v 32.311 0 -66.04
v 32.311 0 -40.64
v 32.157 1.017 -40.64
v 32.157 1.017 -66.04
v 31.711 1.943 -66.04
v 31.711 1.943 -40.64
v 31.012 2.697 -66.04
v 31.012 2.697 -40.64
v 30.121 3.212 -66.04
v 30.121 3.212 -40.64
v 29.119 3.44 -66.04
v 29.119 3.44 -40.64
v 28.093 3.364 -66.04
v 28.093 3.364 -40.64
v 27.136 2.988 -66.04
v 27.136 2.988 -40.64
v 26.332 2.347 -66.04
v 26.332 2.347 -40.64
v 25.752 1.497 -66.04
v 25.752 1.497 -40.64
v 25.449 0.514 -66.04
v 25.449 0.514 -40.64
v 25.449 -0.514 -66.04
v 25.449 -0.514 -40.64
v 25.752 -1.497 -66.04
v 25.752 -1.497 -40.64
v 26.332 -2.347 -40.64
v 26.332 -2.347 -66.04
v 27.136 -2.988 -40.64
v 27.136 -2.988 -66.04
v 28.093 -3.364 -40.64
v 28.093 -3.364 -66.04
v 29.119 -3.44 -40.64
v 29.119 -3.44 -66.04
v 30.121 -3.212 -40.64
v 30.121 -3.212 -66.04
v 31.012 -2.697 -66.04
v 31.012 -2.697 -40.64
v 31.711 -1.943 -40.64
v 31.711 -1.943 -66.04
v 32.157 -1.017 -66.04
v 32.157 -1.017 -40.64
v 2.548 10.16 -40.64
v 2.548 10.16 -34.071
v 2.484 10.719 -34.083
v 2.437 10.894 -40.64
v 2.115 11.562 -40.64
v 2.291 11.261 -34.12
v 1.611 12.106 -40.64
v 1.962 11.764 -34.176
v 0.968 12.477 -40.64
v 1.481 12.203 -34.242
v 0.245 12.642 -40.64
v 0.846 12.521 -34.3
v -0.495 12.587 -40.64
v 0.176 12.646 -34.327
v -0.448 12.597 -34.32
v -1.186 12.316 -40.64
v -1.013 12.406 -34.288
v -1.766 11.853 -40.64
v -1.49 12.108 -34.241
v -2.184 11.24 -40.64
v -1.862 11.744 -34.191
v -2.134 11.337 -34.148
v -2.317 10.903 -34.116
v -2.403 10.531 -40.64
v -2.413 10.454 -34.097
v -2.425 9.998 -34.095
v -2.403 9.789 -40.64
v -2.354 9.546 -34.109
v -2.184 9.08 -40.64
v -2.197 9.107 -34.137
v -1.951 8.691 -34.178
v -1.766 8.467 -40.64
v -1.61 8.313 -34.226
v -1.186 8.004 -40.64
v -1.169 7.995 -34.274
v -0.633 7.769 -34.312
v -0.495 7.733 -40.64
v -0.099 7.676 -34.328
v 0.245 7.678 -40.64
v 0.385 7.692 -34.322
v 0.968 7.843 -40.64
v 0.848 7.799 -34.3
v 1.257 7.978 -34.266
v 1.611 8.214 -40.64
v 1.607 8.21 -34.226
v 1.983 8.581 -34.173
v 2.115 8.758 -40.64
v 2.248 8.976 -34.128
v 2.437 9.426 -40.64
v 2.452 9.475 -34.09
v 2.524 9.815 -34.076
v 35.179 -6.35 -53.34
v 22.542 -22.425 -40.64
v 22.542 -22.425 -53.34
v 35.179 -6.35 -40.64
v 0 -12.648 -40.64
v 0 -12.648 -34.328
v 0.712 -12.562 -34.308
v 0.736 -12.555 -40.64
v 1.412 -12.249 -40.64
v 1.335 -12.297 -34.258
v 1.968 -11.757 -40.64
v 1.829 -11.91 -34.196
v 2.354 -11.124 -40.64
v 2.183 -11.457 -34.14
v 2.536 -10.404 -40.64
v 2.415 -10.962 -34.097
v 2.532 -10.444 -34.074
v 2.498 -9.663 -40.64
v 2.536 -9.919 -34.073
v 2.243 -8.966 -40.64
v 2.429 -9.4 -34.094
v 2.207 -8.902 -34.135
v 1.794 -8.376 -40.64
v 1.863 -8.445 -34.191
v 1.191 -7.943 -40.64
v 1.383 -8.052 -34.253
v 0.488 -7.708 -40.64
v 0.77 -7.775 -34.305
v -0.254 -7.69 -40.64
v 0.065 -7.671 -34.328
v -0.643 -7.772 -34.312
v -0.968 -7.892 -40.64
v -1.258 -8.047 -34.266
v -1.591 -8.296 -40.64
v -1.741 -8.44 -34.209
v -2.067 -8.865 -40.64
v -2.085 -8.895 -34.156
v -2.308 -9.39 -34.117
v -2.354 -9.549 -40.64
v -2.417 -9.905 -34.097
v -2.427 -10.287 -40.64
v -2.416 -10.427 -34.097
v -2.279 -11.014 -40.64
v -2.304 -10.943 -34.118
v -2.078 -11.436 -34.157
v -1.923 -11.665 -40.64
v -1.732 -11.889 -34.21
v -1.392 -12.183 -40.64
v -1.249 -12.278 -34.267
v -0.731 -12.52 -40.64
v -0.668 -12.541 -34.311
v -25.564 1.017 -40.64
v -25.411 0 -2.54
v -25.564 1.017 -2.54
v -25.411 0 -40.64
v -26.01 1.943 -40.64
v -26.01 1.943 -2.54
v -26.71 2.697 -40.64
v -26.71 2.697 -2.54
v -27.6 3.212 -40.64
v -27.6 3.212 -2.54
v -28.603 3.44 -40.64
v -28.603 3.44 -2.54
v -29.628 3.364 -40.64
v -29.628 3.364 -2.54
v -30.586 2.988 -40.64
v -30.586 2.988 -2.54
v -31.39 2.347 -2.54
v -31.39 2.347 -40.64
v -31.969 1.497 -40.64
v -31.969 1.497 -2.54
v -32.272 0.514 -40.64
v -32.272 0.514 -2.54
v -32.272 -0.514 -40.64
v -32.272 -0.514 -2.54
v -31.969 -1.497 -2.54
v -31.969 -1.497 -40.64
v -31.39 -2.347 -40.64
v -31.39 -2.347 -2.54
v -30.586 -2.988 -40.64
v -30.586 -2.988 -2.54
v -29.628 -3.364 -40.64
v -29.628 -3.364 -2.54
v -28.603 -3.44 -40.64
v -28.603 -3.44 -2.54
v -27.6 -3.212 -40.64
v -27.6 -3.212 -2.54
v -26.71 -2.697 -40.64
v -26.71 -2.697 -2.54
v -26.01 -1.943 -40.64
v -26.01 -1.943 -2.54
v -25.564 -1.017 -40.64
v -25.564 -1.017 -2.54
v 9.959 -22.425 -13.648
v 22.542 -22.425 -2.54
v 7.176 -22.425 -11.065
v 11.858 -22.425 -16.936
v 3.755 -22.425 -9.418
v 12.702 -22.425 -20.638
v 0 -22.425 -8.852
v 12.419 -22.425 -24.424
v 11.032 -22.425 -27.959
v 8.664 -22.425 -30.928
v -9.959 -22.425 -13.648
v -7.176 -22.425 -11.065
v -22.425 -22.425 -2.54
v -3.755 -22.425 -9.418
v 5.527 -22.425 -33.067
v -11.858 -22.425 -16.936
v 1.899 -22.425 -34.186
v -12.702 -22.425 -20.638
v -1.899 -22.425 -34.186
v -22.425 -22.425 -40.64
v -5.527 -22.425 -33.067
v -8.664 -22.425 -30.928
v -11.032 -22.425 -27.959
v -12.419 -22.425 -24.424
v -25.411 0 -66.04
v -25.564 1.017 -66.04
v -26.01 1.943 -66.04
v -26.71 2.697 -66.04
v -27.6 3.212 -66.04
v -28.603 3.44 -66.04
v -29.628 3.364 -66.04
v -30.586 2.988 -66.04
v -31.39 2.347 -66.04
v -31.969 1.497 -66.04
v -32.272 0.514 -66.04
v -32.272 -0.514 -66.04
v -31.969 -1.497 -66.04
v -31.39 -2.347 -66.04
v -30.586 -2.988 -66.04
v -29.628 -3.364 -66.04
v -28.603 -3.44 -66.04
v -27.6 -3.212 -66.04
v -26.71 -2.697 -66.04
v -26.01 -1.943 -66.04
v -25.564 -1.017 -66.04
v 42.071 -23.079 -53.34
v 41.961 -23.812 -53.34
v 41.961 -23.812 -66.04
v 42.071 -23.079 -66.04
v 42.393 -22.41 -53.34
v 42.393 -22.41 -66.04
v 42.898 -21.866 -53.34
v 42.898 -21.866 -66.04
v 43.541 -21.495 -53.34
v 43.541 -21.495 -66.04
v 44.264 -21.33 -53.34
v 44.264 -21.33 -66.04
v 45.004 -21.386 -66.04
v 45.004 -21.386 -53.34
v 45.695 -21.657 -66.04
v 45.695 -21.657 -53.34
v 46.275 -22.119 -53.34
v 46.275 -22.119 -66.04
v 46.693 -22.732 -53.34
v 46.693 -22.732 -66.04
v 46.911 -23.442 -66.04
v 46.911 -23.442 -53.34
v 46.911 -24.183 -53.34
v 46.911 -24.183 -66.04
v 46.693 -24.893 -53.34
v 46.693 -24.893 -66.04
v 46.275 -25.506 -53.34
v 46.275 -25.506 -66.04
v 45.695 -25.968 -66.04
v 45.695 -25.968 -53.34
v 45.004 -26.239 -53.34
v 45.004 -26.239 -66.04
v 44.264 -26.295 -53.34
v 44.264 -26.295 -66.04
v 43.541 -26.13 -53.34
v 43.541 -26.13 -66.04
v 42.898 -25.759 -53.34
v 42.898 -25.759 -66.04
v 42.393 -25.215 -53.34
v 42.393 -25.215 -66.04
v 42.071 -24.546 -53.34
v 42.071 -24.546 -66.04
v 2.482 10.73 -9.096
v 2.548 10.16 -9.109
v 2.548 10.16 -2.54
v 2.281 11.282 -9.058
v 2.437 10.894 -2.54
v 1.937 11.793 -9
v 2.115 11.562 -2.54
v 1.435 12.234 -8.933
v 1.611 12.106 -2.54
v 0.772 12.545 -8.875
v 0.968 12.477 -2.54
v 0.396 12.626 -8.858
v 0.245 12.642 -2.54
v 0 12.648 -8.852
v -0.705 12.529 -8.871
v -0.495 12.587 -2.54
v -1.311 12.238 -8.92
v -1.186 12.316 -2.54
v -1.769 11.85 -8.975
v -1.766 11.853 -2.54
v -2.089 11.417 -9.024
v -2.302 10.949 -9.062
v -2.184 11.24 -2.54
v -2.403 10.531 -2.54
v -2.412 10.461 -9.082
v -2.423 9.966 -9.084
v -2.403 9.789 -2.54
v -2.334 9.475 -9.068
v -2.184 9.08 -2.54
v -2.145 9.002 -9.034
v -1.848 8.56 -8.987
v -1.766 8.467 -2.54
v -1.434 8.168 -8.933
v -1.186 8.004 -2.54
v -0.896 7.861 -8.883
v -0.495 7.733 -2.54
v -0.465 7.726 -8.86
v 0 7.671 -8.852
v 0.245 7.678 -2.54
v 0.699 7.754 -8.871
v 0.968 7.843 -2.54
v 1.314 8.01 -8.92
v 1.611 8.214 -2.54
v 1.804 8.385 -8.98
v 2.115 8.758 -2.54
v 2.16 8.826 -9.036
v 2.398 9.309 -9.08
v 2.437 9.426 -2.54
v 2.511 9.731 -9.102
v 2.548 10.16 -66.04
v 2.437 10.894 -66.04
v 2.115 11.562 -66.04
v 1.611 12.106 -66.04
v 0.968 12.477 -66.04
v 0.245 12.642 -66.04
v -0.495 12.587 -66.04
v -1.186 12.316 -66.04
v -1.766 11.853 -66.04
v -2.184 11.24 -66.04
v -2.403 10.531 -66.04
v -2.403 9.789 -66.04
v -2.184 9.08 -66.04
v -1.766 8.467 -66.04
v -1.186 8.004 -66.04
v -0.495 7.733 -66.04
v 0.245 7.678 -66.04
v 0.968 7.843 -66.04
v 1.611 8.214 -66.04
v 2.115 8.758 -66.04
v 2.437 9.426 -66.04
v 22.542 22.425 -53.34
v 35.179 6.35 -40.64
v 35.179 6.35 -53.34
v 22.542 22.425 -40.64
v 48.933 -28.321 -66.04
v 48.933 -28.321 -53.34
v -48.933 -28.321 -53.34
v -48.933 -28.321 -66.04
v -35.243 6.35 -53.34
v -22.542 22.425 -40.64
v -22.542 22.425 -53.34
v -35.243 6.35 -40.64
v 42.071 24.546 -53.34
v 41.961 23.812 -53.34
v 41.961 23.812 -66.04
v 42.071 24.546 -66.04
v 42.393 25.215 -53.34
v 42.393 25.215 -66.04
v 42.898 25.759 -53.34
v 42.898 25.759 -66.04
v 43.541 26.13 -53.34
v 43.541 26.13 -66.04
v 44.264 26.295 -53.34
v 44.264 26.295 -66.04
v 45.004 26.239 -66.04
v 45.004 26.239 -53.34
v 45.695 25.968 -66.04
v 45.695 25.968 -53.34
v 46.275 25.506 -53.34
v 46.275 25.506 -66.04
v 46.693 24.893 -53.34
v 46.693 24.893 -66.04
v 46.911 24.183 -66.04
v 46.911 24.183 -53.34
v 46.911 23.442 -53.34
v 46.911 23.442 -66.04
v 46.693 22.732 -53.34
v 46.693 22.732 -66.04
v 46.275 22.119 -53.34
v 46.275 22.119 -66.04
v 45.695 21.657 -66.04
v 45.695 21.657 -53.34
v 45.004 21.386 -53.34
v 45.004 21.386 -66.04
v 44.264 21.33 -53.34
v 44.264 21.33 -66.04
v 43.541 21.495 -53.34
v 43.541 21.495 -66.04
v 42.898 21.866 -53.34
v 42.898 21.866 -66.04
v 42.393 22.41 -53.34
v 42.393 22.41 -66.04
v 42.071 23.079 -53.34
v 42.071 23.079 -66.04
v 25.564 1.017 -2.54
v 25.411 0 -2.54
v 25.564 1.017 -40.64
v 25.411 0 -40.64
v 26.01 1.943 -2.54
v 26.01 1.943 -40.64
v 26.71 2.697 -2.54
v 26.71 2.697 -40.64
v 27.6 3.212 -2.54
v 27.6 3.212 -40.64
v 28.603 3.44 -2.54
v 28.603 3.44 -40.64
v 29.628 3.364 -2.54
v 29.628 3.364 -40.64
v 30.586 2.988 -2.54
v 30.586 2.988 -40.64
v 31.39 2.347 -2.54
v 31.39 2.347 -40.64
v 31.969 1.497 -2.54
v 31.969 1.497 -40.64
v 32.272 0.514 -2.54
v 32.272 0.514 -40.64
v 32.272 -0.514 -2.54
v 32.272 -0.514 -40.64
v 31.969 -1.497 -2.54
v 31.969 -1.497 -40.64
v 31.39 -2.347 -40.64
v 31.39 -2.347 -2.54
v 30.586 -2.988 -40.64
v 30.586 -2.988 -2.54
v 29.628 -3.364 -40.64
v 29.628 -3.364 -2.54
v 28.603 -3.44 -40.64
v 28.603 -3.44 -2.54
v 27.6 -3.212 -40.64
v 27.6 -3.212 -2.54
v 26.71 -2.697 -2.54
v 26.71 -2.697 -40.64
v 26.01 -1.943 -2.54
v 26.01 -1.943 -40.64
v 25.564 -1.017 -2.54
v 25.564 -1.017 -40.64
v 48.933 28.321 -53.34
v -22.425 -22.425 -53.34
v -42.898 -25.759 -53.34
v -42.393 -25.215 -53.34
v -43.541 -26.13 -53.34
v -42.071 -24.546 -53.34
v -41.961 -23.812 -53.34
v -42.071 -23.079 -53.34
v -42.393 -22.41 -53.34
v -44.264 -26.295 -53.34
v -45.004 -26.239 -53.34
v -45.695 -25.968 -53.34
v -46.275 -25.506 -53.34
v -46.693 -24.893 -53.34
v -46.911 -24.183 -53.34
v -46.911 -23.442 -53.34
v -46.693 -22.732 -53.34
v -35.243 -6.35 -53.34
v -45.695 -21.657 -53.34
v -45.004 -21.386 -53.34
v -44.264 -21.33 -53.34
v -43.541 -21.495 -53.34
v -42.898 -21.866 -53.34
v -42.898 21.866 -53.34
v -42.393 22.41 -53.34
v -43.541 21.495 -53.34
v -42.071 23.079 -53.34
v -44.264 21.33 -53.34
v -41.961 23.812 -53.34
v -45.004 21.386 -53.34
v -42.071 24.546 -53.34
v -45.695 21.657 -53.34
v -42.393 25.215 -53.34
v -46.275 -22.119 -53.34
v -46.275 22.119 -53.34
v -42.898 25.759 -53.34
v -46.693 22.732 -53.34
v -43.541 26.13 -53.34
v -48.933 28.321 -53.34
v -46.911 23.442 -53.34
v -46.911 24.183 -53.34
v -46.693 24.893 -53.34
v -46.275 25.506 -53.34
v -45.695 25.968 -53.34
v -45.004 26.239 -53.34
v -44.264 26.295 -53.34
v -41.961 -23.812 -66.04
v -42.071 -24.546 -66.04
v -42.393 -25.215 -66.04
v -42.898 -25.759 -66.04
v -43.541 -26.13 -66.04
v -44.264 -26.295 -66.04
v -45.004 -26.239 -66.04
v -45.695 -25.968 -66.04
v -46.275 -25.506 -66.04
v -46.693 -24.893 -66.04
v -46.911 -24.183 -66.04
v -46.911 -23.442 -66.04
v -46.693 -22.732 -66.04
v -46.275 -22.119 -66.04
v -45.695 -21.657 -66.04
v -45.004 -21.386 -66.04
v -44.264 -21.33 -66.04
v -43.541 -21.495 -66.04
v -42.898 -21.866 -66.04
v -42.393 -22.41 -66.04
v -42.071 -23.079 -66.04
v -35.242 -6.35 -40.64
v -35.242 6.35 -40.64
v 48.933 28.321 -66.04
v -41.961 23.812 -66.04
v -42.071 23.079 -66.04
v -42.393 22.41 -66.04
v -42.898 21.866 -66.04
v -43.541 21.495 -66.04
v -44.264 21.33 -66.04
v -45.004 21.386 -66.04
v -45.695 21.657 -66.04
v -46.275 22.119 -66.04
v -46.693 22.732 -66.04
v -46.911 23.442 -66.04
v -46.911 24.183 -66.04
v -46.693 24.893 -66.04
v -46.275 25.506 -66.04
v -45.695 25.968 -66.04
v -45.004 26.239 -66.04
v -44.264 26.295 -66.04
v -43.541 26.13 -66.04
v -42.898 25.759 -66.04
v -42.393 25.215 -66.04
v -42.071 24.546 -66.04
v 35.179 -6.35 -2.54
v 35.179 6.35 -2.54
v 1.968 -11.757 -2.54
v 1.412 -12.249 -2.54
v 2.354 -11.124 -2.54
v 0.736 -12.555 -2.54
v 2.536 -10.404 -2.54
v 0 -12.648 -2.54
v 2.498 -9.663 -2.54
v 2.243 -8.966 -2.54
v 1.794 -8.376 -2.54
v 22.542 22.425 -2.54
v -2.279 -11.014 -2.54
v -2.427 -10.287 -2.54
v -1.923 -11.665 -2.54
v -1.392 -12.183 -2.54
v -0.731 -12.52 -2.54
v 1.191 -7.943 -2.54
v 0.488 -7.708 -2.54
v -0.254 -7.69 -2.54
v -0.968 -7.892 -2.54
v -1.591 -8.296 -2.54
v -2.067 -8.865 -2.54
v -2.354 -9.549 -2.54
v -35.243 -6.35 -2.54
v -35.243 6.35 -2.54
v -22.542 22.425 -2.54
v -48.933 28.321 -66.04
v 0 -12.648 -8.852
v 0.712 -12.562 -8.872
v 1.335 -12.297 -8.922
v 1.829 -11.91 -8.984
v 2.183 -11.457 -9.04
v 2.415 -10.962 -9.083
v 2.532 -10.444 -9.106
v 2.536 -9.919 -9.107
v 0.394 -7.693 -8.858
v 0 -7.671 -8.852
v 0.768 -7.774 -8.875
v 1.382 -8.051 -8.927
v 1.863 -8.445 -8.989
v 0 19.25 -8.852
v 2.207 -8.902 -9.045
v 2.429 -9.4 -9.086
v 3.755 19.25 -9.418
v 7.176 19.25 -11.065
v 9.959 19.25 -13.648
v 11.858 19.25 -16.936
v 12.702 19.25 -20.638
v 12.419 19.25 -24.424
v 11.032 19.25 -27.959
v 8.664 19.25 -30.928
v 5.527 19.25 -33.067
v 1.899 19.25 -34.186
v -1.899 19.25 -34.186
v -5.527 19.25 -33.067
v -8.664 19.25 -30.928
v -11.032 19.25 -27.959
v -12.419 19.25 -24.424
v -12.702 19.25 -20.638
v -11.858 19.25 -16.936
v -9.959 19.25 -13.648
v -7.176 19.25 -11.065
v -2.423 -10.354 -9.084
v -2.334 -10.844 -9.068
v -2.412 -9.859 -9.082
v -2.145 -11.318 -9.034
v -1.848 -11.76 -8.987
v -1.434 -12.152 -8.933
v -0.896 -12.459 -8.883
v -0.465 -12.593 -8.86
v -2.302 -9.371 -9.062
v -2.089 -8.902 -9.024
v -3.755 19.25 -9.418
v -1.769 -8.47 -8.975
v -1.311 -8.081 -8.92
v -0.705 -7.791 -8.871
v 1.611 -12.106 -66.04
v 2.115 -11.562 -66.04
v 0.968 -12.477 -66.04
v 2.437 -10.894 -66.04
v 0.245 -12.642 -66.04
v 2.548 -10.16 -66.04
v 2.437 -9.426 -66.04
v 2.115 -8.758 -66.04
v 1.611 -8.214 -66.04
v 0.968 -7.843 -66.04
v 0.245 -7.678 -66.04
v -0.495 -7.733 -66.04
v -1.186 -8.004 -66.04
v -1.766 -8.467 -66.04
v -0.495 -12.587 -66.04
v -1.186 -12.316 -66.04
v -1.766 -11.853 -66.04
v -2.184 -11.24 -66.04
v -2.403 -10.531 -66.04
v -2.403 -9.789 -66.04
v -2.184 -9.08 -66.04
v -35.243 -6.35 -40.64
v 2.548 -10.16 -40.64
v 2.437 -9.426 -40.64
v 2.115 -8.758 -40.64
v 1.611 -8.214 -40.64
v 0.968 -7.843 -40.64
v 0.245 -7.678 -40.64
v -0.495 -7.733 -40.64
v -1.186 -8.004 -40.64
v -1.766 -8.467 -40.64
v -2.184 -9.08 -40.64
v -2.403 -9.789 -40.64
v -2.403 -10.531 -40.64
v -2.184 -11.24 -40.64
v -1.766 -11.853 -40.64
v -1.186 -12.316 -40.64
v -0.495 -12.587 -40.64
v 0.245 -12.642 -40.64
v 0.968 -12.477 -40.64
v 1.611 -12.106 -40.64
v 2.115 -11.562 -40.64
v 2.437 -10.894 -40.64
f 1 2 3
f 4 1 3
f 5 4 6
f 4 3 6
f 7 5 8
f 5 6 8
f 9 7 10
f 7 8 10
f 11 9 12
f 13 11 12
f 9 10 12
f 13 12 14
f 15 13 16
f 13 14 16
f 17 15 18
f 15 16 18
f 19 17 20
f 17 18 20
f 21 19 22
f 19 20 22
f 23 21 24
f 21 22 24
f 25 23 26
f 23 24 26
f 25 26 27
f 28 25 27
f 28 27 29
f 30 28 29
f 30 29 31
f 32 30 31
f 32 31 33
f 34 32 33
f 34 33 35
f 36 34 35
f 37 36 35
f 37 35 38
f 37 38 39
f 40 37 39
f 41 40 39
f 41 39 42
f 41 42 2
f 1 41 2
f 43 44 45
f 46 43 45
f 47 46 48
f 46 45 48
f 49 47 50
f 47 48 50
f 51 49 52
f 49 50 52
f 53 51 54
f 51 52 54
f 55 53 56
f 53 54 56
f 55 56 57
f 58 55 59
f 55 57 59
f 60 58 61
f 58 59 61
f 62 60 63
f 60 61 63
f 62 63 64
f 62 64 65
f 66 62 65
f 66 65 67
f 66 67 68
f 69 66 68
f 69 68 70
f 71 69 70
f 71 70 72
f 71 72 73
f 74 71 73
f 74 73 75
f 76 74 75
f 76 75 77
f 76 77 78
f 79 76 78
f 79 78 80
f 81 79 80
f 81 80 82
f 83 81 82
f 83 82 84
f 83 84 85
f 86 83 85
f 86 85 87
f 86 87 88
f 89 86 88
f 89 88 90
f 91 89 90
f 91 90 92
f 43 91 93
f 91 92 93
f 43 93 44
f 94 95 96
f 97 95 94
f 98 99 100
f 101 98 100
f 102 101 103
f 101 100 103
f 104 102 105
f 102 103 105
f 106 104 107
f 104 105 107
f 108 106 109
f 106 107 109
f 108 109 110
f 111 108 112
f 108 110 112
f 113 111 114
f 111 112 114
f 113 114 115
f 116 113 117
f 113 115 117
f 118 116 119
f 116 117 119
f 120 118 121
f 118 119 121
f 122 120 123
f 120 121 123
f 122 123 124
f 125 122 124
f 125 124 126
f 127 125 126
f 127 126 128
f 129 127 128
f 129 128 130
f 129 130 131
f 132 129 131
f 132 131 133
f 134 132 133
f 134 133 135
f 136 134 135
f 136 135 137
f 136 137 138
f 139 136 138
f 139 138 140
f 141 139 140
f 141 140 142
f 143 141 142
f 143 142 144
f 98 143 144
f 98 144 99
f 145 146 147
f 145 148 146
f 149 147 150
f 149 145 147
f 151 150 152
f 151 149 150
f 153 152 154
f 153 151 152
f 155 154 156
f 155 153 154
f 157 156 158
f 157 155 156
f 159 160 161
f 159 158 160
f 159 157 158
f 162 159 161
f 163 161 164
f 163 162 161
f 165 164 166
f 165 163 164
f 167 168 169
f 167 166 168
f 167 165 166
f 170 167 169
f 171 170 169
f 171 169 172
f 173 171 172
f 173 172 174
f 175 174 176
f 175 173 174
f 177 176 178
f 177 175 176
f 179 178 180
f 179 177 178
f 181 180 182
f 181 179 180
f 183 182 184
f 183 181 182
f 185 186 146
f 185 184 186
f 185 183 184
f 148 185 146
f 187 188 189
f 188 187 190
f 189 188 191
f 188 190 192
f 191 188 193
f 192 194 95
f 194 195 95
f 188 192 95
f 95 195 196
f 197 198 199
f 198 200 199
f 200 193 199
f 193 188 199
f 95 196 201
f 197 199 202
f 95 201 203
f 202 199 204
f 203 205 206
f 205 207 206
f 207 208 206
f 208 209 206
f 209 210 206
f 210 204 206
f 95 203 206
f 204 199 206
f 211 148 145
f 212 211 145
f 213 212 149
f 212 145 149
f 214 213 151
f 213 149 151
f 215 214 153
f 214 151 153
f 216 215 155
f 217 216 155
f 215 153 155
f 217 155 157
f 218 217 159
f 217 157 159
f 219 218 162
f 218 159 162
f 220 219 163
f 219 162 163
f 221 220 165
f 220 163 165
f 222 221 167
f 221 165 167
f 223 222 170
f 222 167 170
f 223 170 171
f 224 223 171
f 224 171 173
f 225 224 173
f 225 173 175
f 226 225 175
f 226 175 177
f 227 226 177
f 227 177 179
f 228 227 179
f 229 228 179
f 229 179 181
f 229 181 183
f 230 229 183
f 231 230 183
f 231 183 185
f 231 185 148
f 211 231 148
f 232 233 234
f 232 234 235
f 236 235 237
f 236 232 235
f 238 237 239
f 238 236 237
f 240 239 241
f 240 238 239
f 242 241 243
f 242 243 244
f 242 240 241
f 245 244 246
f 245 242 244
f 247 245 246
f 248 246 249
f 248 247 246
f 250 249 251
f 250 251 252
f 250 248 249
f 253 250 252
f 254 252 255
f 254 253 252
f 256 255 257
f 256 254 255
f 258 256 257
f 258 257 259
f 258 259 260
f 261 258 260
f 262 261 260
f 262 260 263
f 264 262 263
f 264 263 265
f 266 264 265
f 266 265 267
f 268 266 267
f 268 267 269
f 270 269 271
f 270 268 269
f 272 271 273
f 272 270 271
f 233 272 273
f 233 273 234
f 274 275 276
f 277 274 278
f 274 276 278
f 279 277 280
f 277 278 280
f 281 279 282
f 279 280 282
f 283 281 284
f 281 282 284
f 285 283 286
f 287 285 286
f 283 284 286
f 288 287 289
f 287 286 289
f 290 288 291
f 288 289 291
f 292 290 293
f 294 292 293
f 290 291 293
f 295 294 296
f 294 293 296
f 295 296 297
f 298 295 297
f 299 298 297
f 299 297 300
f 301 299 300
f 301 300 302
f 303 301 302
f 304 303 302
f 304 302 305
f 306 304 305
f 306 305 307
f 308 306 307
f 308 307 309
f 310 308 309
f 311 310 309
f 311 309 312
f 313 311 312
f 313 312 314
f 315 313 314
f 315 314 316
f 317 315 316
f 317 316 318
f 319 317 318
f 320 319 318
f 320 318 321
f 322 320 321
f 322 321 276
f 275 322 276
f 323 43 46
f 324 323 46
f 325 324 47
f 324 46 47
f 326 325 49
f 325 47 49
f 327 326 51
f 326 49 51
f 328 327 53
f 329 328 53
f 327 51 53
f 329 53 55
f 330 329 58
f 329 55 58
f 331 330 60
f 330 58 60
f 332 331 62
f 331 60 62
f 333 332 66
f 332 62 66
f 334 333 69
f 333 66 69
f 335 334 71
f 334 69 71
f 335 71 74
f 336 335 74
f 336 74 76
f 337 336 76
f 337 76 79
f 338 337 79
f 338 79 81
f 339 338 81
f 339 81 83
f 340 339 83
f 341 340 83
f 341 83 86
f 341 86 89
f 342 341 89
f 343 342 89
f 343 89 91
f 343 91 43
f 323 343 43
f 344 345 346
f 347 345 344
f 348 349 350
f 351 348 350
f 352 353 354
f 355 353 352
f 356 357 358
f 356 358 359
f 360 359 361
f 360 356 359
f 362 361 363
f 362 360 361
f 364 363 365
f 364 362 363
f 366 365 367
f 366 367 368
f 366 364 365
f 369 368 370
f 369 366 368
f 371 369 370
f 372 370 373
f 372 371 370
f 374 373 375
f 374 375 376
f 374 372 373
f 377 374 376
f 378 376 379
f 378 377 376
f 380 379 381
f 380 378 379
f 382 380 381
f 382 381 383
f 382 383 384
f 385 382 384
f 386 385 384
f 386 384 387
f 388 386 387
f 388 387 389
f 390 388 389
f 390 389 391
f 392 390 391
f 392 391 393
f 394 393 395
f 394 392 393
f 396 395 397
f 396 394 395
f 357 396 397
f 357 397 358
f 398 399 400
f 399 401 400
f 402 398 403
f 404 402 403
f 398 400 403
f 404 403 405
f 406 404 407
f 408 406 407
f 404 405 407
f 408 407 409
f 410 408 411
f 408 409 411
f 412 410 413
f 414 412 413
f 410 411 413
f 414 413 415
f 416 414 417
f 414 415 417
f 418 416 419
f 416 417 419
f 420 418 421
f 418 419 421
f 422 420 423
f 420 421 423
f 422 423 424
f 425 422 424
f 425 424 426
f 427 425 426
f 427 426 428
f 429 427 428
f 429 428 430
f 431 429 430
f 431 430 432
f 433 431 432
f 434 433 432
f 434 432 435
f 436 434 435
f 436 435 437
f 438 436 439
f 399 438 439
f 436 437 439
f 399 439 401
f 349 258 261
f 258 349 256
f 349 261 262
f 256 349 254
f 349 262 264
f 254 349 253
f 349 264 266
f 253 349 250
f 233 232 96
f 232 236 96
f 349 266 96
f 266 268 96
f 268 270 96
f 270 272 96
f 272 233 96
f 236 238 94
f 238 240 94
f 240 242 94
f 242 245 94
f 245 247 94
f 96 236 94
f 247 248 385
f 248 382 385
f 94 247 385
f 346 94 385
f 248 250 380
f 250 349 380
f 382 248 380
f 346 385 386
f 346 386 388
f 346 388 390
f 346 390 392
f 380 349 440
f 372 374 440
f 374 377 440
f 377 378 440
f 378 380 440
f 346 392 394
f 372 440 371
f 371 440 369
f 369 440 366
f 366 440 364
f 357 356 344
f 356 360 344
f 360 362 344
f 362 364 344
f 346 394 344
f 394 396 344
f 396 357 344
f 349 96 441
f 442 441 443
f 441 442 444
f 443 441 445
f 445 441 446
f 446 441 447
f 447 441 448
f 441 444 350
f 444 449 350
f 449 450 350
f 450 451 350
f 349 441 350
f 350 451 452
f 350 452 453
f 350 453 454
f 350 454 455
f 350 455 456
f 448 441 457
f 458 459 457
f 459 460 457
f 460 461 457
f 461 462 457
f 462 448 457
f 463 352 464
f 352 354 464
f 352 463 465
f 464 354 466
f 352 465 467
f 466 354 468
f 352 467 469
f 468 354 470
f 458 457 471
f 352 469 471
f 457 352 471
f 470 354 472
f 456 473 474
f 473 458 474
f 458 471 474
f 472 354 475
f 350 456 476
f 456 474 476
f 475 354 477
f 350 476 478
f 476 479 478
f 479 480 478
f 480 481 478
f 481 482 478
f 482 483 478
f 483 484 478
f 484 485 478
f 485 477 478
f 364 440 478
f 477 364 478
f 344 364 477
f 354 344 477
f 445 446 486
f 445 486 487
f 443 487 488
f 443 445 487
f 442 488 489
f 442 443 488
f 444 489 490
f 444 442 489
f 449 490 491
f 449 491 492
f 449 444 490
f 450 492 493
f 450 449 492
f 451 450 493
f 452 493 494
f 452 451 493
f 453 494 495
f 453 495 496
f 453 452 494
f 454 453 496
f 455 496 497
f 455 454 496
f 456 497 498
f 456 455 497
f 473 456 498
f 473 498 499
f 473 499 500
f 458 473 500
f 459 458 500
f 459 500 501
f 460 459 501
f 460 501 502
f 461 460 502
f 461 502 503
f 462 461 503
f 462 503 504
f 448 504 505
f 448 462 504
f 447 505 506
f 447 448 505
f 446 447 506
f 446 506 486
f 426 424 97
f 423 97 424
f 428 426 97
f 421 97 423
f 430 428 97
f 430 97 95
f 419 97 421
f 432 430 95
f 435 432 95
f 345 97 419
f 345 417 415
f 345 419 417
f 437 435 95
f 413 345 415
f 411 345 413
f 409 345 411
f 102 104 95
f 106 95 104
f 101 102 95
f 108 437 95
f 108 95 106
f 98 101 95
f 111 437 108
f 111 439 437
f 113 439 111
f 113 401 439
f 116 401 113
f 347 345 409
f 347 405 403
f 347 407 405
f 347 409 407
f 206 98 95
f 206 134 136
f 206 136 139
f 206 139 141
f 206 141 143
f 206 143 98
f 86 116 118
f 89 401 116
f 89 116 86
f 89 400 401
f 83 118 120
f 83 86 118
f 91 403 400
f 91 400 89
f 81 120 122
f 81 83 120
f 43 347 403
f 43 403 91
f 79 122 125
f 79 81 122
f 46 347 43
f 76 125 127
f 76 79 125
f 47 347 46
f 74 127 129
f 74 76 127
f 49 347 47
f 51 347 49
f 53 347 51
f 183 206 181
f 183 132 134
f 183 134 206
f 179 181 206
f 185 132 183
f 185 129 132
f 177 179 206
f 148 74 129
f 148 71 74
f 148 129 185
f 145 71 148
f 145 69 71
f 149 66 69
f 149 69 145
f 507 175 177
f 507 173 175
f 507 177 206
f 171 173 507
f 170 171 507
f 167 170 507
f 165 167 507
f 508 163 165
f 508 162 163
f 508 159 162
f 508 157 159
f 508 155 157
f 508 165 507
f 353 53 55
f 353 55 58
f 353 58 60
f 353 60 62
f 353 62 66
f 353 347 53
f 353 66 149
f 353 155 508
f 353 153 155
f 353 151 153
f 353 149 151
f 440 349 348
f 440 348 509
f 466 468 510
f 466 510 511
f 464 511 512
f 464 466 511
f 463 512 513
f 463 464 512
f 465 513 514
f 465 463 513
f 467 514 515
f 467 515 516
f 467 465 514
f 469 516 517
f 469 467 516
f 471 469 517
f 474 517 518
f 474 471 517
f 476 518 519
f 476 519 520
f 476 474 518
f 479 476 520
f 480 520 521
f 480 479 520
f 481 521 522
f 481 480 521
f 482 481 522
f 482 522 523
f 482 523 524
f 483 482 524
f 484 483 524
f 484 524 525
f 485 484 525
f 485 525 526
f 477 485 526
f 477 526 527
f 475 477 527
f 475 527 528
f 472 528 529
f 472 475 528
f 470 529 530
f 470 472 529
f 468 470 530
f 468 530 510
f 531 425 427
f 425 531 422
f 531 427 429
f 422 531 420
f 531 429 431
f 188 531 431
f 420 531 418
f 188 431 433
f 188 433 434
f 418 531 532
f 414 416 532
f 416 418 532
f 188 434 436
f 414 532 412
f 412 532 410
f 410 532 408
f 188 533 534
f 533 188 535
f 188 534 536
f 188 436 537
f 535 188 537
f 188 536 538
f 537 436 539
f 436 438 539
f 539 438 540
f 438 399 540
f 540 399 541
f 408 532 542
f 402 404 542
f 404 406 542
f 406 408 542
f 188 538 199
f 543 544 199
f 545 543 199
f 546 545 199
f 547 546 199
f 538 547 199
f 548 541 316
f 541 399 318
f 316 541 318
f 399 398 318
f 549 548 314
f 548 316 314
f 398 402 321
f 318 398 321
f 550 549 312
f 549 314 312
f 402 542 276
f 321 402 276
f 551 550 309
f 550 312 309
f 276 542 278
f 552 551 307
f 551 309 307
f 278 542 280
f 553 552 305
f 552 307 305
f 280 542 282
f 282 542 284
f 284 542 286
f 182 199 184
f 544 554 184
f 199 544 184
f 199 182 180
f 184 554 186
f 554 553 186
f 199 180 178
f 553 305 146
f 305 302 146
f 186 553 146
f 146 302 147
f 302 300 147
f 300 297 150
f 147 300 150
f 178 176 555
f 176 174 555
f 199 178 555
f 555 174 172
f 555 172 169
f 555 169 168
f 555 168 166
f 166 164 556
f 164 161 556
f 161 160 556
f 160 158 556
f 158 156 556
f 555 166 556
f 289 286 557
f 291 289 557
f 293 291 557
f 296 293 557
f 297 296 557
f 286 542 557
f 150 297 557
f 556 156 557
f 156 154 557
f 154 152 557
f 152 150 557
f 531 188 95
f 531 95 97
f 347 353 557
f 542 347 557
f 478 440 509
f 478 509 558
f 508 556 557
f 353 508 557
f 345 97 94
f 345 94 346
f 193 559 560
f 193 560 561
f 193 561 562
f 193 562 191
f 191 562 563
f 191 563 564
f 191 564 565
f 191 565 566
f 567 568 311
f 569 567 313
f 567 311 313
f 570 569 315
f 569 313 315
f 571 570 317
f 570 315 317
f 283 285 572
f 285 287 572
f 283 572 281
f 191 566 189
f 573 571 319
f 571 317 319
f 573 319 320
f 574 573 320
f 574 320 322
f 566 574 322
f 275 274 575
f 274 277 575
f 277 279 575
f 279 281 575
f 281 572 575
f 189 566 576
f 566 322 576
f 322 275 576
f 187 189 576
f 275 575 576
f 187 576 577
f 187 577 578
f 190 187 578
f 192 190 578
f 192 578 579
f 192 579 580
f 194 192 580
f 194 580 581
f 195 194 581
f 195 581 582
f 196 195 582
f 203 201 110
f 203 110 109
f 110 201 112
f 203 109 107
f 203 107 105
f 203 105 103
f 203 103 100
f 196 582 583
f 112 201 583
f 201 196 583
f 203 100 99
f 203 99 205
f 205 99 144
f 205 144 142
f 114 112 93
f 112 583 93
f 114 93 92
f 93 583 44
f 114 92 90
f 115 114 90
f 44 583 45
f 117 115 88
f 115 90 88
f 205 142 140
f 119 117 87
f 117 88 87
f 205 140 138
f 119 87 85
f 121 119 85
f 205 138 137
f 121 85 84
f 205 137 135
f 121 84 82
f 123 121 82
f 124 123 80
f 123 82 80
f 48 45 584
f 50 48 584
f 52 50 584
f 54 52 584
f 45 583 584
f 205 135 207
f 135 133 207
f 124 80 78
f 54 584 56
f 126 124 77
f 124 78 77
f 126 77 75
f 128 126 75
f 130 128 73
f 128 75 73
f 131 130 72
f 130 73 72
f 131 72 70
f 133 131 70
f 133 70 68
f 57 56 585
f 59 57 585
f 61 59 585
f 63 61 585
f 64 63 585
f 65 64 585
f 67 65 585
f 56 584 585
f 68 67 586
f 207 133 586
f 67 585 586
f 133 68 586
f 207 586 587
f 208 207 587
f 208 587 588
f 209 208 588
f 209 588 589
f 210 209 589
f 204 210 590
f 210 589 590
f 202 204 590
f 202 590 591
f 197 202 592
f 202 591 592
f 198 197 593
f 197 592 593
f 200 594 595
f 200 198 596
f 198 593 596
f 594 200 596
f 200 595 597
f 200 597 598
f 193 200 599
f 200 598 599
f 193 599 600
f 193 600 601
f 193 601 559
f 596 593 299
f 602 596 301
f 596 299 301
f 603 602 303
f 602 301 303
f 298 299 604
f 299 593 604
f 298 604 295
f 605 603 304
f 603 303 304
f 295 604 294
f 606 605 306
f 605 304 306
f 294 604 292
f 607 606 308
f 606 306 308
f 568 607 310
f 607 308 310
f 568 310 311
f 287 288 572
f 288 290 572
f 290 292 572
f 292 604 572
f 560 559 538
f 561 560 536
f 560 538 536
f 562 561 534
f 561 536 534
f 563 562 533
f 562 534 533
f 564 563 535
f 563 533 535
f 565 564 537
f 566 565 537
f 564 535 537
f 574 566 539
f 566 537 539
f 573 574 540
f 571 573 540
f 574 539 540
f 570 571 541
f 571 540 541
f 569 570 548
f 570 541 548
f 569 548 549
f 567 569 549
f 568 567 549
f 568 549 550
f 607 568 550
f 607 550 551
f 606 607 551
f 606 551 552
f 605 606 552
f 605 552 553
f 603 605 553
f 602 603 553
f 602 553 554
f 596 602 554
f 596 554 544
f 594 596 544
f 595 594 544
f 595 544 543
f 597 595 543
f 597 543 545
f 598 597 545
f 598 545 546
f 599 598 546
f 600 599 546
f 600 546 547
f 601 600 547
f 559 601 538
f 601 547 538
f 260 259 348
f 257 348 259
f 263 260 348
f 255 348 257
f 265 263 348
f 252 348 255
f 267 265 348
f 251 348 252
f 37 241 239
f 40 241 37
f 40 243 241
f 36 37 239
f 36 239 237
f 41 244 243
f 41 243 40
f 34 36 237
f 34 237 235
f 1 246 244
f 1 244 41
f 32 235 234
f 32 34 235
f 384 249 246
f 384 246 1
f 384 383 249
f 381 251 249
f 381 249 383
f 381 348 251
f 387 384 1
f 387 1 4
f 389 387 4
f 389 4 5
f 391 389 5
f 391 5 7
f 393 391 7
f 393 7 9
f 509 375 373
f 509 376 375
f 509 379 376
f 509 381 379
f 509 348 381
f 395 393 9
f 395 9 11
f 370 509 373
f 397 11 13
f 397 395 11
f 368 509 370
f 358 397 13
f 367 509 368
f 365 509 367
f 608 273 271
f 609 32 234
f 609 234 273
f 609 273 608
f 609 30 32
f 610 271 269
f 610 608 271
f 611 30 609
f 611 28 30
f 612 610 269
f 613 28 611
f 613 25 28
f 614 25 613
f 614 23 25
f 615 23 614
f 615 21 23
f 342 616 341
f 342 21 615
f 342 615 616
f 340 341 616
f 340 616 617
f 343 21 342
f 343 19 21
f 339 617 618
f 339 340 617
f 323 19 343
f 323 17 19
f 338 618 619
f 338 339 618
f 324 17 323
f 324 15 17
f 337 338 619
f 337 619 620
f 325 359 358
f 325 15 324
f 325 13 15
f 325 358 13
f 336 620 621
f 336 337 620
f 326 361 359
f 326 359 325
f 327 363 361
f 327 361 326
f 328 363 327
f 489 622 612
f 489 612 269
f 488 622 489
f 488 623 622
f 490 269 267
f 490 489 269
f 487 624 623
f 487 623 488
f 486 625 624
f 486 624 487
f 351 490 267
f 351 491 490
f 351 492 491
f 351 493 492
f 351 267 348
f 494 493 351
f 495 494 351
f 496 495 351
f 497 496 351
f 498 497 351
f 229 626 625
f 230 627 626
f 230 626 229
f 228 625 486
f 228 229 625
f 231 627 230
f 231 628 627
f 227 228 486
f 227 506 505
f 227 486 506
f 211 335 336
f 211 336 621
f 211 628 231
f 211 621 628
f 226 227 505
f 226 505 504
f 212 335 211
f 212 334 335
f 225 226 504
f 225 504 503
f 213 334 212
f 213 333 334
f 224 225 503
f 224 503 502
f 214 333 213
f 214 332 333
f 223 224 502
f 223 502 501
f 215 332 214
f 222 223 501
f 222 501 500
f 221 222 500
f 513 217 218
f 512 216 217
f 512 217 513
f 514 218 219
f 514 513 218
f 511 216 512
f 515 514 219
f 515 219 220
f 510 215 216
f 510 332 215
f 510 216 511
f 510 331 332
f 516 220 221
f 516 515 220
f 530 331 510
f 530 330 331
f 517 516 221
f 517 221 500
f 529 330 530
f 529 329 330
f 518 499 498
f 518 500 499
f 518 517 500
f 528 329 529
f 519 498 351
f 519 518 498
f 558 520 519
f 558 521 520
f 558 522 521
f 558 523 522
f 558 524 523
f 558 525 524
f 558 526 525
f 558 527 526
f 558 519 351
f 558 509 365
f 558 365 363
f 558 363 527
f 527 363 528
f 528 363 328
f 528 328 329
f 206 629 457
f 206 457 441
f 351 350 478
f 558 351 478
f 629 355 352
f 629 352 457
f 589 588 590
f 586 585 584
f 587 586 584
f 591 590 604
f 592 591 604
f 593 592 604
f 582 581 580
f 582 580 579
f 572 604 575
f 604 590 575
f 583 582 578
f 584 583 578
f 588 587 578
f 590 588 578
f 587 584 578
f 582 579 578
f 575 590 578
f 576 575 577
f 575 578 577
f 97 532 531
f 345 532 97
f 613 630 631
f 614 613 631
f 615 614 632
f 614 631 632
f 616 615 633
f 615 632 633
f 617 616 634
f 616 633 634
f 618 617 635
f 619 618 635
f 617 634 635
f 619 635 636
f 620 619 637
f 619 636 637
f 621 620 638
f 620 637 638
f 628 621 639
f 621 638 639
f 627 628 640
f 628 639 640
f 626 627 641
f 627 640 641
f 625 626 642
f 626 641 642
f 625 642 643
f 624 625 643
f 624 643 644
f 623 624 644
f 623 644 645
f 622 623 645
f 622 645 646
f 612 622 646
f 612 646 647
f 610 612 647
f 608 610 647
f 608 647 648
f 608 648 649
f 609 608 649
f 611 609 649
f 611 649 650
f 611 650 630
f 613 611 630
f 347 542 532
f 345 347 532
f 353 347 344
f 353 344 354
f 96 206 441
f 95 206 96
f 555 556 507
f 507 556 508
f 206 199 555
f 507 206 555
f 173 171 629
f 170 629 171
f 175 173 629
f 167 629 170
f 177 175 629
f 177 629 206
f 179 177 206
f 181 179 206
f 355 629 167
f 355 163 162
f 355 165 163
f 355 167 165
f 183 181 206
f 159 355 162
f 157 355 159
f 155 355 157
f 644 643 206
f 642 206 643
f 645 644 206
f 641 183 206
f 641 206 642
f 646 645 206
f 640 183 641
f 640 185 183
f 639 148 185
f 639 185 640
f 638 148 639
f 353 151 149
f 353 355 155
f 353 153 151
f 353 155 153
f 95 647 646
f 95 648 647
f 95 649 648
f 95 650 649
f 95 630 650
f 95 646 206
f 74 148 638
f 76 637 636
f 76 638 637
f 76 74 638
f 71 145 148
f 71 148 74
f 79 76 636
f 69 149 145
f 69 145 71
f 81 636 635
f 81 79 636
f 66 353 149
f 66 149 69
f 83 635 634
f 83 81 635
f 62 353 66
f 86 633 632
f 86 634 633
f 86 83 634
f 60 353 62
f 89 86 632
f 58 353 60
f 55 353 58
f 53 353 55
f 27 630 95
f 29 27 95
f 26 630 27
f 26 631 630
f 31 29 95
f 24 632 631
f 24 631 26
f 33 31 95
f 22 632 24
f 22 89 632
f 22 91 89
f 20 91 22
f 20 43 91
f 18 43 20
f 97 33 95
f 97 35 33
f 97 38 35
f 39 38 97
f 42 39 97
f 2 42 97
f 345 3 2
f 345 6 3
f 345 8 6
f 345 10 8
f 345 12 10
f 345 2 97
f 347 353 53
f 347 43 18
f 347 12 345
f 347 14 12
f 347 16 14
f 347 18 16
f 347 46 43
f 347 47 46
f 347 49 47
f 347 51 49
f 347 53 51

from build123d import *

# Parameters (mm, degrees)
CROQUIS1_W                   = 38.5
CROQUIS1_H                   = 38.5
CROQUIS1_R                   = 1.631954222
SALIENTE_EXTRUIR1_DEPTH      = 3.175
CROQUIS3_W                   = 45.084999084
CROQUIS3_H                   = 18.415000916
SALIENTE_EXTRUIR3_DEPTH      = 3.175
CROQUIS4_W                   = 18.415000916
CROQUIS4_H                   = 38.5
SALIENTE_EXTRUIR4_DEPTH      = 3.175
SALIENTE_EXTRUIR5_DEPTH      = 3.175
CROQUIS6_W                   = 45.084999084
CROQUIS6_H                   = 18.415000916
SALIENTE_EXTRUIR6_DEPTH      = 3.175
CROQUIS7_W                   = 12.817500305
CROQUIS7_H                   = 12.69999981
CROQUIS7_R                   = 2.4892
SALIENTE_EXTRUIR7_DEPTH      = 18.415001
SALIENTE_EXTRUIR8_DEPTH      = 35.179
SALIENTE_EXTRUIR8_DEPTH_BACK = 35.2425
CROQUIS10_W                  = 38.1
CROQUIS10_H                  = 44.85
CORTAR_EXTRUIR1_DEPTH        = 57.537814361
CROQUIS12_R                  = 12.7381
CORTAR_EXTRUIR2_DEPTH        = 71.036889764
CROQUIS13_R                  = 3.45
CORTAR_EXTRUIR3_DEPTH        = 73.335382738
CROQUIS14_R                  = 12.7381
SALIENTE_EXTRUIR9_DEPTH      = 3.175
CROQUIS15_R                  = 2.4892
CORTAR_EXTRUIR4_DEPTH        = 57.537814361
SALIENTE_EXTRUIR10_DEPTH     = 38.1
SALIENTE_EXTRUIR11_DEPTH     = 12.7
CROQUIS19_W                  = 97.8662
CROQUIS19_H                  = 56.642
CROQUIS19_R                  = 2.4892
SALIENTE_EXTRUIR12_DEPTH     = 12.7
CROQUIS20_R                  = 3.45
CROQUIS20_R_2                = 2.4892
CORTAR_EXTRUIR5_DEPTH        = 86.022216606


with BuildPart() as part:
    # Croquis1 → Saliente-Extruir1 (new body)
    with BuildSketch(Plane.XY):
        Rectangle(CROQUIS1_W, CROQUIS1_H)
        with Locations((-14, 14)):
            Circle(CROQUIS1_R, mode=Mode.SUBTRACT)
        with Locations((14, 14)):
            Circle(CROQUIS1_R, mode=Mode.SUBTRACT)
        with Locations(Location((14, -14, 0), (0, 0, 180))):
            Circle(CROQUIS1_R, mode=Mode.SUBTRACT)
        with Locations(Location((-14, -14, 0), (0, 0, 180))):
            Circle(CROQUIS1_R, mode=Mode.SUBTRACT)
        with BuildLine():
            Line((4.778981922, 6.730999947), (11.112500191, 6.730999947))
            Line((11.112500191, 6.730999947), (11.112500191, -6.730999947))
            Line((11.112500191, -6.730999947), (4.778981922, -6.730999947))
            ThreePointArc((4.778981922, -6.730999947), (0, -8.255000211), (-4.778981922, -6.730999947))
            Line((-4.778981922, -6.730999947), (-11.112500191, -6.730999947))
            Line((-11.112500191, -6.730999947), (-11.112500191, 6.730999947))
            Line((-11.112500191, 6.730999947), (-4.778981922, 6.730999947))
            ThreePointArc((-4.778981922, 6.730999947), (0, 8.255000211), (4.778981922, 6.730999947))
        make_face(mode=Mode.SUBTRACT)
    extrude(amount=SALIENTE_EXTRUIR1_DEPTH)

    # Croquis3 → Saliente-Extruir3 (add)
    with BuildSketch(Plane.XZ.offset(19.25)):
        with Locations((0, 9.207500458)):
            Rectangle(CROQUIS3_W, CROQUIS3_H)
    extrude(amount=SALIENTE_EXTRUIR3_DEPTH)

    # Croquis4 → Saliente-Extruir4 (add)
    with BuildSketch(Plane.ZY.offset(19.25)):
        with Locations((9.207500458, 0)):
            Rectangle(CROQUIS4_W, CROQUIS4_H)
    extrude(amount=SALIENTE_EXTRUIR4_DEPTH)

    # Croquis5 → Saliente-Extruir5 (add)
    with BuildSketch(Plane(origin=(19.25, 0, 0), x_dir=(0, 0, -1), z_dir=(1, 0, 0))):
        with BuildLine():
            Line((-12.617739677, -7.684936523), (-18.415000916, -7.684936523))
            Line((-18.415000916, -7.684936523), (-18.415000916, 19.25))
            Line((-18.415000916, 19.25), (0, 19.25))
            Line((0, 19.25), (0, -19.25))
            Line((0, -19.25), (-18.415000916, -19.25))
            Line((-18.415000916, -19.25), (-18.415000916, -12.304718971))
            Line((-18.415000916, -12.304718971), (-12.348668098, -12.304718971))
            ThreePointArc((-12.348668098, -12.304718971), (-10.544975303, -9.881938833), (-12.617739677, -7.684936523))
        make_face()
    extrude(amount=SALIENTE_EXTRUIR5_DEPTH)

    # Croquis6 → Saliente-Extruir6 (add)
    with BuildSketch(Plane(origin=(0, 19.25, 0), x_dir=(1, 0, 0), z_dir=(0, 1, 0))):
        with Locations((0, -9.207500458)):
            Rectangle(CROQUIS6_W, CROQUIS6_H)
    extrude(amount=SALIENTE_EXTRUIR6_DEPTH)

    # Croquis7 → Saliente-Extruir7 (add)
    # profile 1 of 2: a face of its own
    with BuildSketch(Plane.XY):
        with Locations((-28.833750153, 0)):
            Rectangle(CROQUIS7_W, CROQUIS7_H)
        with Locations((-28.833750153, 0)):
            Circle(CROQUIS7_R, mode=Mode.SUBTRACT)
    # profile 2 of 2: a face of its own
    with BuildSketch(Plane.XY):
        with Locations((28.833750153, 0)):
            Rectangle(CROQUIS7_W, CROQUIS7_H)
        with Locations(Location((28.833750153, 0, 0), (0, 0, 180))):
            Circle(CROQUIS7_R, mode=Mode.SUBTRACT)
    extrude(amount=SALIENTE_EXTRUIR7_DEPTH)


with BuildPart() as body_2:
    # Croquis10 → Saliente-Extruir8 (new, two sides: drawn at the far end of the back side and taken through both)
    with BuildSketch(Plane(origin=(0, 0, 0), x_dir=(0, 0, -1), z_dir=(1, 0, 0)).offset(-SALIENTE_EXTRUIR8_DEPTH_BACK)):
        with Locations((21.59, 0)):
            Rectangle(CROQUIS10_W, CROQUIS10_H)
    extrude(amount=SALIENTE_EXTRUIR8_DEPTH + SALIENTE_EXTRUIR8_DEPTH_BACK)

    # Croquis11 → Cortar-Extruir1 (cut, through all)
    with BuildSketch(Plane.XY.offset(-2.54)):
        Polygon((22.542499542, 22.425), (22.542499542, 6.349999905), (35.242500305, 6.349999905), align=None)
        Polygon((35.242500305, -6.349999905), (22.542499542, -6.349999905), (22.542499542, -22.425), align=None)
        Polygon((-22.542499542, 22.425), (-22.542499542, 6.349999905), (-35.242500305, 6.349999905), align=None)
        Polygon((-35.242500305, -6.349999905), (-22.425, -6.349999905), (-22.425, -22.425), align=None)
    extrude(amount=-CORTAR_EXTRUIR1_DEPTH, mode=Mode.SUBTRACT)


with BuildPart() as cortar_extruir1_piece_1:
    # of the separate pieces the step leaves, piece 1, a body of its own (cortar_extruir1_pieces)
    add(body_2.part.solids().sort_by_distance((-22.425, -6.349999905, -2.54))[0])

    # Croquis12 → Cortar-Extruir2 (cut, through all)
    with BuildSketch(Plane(origin=(0, 22.425, 0), x_dir=(1, 0, 0), z_dir=(0, 1, 0))):
        with Locations(Location((0, 21.59, 0), (0, 0, 270))):
            Circle(CROQUIS12_R)
    extrude(amount=-CORTAR_EXTRUIR2_DEPTH, mode=Mode.SUBTRACT)

    # Croquis13 → Cortar-Extruir3 (cut, symmetric)
    with BuildSketch(Plane(origin=(0, 0, -40.64), x_dir=(-1, 0, 0), z_dir=(0, 0, -1))):
        with Locations((-28.860749771, 0)):
            Circle(CROQUIS13_R)
    cortar_extruir3 = extrude(amount=CORTAR_EXTRUIR3_DEPTH, both=True, mode=Mode.SUBTRACT)

    # Simetría1: Cortar-Extruir3 across plane
    add(cortar_extruir3.mirror(Plane(origin=(0, 0, 0), x_dir=(0, 0, 1), z_dir=(1, 0, 0))), mode=Mode.SUBTRACT)

    # Croquis14 → Saliente-Extruir9 (add)
    with BuildSketch(Plane(origin=(0, 22.425, 0), x_dir=(1, 0, 0), z_dir=(0, 1, 0))):
        with Locations(Location((0, 21.59, 0), (0, 0, 270))):
            Circle(CROQUIS14_R)
    extrude(amount=-SALIENTE_EXTRUIR9_DEPTH)

    # Croquis15 → Cortar-Extruir4 (cut, through all)
    with BuildSketch(Plane.XY.offset(-2.54)):
        with Locations((0.058749771, 10.15983014)):
            Circle(CROQUIS15_R)
        with Locations(Location((0.058749771, -10.15983014, 0), (0, 0, 268.647586966))):
            Circle(CROQUIS15_R)
    extrude(amount=-CORTAR_EXTRUIR4_DEPTH, mode=Mode.SUBTRACT)

    # Croquis17 → Saliente-Extruir10 (add)
    with BuildSketch(Plane.XY.offset(-2.54)):
        Polygon((-35.242500305, 6.349999905), (-22.542499542, 22.425), (-22.542499542, 6.349999905), align=None)
        Polygon((-22.425, -22.425), (-35.242500305, -6.349999905), (-22.425, -6.349999905), align=None)
        Polygon((22.542499542, -22.425), (35.179, -6.349999905), (22.542499542, -6.349999905), align=None)
        Polygon((22.542499542, 22.425), (35.179, 6.349999905), (22.542499542, 6.349999905), align=None)
    extrude(amount=-SALIENTE_EXTRUIR10_DEPTH)


with BuildPart() as cortar_extruir1_piece_2:
    # of the separate pieces the step leaves, piece 2, a body of its own (cortar_extruir1_pieces)
    add(body_2.part.solids().sort_by_distance((-35.2425, -22.425, -40.64))[0])


with BuildPart() as cortar_extruir1_piece_3:
    # of the separate pieces the step leaves, piece 3, a body of its own (cortar_extruir1_pieces)
    add(body_2.part.solids().sort_by_distance((-35.2425, 22.425, -2.54))[0])


with BuildPart() as cortar_extruir1_piece_4:
    # of the separate pieces the step leaves, piece 4, a body of its own (cortar_extruir1_pieces)
    add(body_2.part.solids().sort_by_distance((35.179, 22.425, -2.54))[0])


with BuildPart() as cortar_extruir1_piece_5:
    # of the separate pieces the step leaves, piece 5, a body of its own (cortar_extruir1_pieces)
    add(body_2.part.solids().sort_by_distance((35.179, -22.425, -40.64))[0])


with BuildPart() as body_2_2:
    # Croquis18 → Saliente-Extruir11 (new body)
    with BuildSketch(Plane(origin=(0, 0, -40.64), x_dir=(-1, 0, 0), z_dir=(0, 0, -1))):
        Polygon((-22.542499542, 22.425), (22.542499542, 22.425), (35.242500305, 6.349999905), (35.242500305, -6.349999905), (22.425, -22.425), (-22.542499542, -22.425), (-35.179, -6.349999905), (-35.179, 6.349999905), align=None)
    extrude(amount=SALIENTE_EXTRUIR11_DEPTH)

    # Croquis19 → Saliente-Extruir12 (add)
    with BuildSketch(Plane(origin=(0, 0, -53.34), x_dir=(-1, 0, 0), z_dir=(0, 0, -1))):
        Rectangle(CROQUIS19_W, CROQUIS19_H)
        with Locations((-44.45, 23.8125)):
            Circle(CROQUIS19_R, mode=Mode.SUBTRACT)
        with Locations((-44.45, -23.8125)):
            Circle(CROQUIS19_R, mode=Mode.SUBTRACT)
        with Locations(Location((44.45, -23.8125, 0), (0, 0, 180))):
            Circle(CROQUIS19_R, mode=Mode.SUBTRACT)
        with Locations(Location((44.45, 23.8125, 0), (0, 0, 180))):
            Circle(CROQUIS19_R, mode=Mode.SUBTRACT)
    extrude(amount=SALIENTE_EXTRUIR12_DEPTH)

    # Croquis20 → Cortar-Extruir5 (cut, through all)
    with BuildSketch(Plane.XY.offset(-2.54)):
        with Locations((28.860749771, 0)):
            Circle(CROQUIS20_R)
        with Locations((0.058749771, -10.15983014)):
            Circle(CROQUIS20_R_2)
        with Locations((-28.860749771, 0)):
            Circle(CROQUIS20_R)
        with Locations((0.058749771, 10.15983014)):
            Circle(CROQUIS20_R_2)
    extrude(amount=-CORTAR_EXTRUIR5_DEPTH, mode=Mode.SUBTRACT)


solid = Compound([cortar_extruir1_piece_1.part, body_2_2.part])
